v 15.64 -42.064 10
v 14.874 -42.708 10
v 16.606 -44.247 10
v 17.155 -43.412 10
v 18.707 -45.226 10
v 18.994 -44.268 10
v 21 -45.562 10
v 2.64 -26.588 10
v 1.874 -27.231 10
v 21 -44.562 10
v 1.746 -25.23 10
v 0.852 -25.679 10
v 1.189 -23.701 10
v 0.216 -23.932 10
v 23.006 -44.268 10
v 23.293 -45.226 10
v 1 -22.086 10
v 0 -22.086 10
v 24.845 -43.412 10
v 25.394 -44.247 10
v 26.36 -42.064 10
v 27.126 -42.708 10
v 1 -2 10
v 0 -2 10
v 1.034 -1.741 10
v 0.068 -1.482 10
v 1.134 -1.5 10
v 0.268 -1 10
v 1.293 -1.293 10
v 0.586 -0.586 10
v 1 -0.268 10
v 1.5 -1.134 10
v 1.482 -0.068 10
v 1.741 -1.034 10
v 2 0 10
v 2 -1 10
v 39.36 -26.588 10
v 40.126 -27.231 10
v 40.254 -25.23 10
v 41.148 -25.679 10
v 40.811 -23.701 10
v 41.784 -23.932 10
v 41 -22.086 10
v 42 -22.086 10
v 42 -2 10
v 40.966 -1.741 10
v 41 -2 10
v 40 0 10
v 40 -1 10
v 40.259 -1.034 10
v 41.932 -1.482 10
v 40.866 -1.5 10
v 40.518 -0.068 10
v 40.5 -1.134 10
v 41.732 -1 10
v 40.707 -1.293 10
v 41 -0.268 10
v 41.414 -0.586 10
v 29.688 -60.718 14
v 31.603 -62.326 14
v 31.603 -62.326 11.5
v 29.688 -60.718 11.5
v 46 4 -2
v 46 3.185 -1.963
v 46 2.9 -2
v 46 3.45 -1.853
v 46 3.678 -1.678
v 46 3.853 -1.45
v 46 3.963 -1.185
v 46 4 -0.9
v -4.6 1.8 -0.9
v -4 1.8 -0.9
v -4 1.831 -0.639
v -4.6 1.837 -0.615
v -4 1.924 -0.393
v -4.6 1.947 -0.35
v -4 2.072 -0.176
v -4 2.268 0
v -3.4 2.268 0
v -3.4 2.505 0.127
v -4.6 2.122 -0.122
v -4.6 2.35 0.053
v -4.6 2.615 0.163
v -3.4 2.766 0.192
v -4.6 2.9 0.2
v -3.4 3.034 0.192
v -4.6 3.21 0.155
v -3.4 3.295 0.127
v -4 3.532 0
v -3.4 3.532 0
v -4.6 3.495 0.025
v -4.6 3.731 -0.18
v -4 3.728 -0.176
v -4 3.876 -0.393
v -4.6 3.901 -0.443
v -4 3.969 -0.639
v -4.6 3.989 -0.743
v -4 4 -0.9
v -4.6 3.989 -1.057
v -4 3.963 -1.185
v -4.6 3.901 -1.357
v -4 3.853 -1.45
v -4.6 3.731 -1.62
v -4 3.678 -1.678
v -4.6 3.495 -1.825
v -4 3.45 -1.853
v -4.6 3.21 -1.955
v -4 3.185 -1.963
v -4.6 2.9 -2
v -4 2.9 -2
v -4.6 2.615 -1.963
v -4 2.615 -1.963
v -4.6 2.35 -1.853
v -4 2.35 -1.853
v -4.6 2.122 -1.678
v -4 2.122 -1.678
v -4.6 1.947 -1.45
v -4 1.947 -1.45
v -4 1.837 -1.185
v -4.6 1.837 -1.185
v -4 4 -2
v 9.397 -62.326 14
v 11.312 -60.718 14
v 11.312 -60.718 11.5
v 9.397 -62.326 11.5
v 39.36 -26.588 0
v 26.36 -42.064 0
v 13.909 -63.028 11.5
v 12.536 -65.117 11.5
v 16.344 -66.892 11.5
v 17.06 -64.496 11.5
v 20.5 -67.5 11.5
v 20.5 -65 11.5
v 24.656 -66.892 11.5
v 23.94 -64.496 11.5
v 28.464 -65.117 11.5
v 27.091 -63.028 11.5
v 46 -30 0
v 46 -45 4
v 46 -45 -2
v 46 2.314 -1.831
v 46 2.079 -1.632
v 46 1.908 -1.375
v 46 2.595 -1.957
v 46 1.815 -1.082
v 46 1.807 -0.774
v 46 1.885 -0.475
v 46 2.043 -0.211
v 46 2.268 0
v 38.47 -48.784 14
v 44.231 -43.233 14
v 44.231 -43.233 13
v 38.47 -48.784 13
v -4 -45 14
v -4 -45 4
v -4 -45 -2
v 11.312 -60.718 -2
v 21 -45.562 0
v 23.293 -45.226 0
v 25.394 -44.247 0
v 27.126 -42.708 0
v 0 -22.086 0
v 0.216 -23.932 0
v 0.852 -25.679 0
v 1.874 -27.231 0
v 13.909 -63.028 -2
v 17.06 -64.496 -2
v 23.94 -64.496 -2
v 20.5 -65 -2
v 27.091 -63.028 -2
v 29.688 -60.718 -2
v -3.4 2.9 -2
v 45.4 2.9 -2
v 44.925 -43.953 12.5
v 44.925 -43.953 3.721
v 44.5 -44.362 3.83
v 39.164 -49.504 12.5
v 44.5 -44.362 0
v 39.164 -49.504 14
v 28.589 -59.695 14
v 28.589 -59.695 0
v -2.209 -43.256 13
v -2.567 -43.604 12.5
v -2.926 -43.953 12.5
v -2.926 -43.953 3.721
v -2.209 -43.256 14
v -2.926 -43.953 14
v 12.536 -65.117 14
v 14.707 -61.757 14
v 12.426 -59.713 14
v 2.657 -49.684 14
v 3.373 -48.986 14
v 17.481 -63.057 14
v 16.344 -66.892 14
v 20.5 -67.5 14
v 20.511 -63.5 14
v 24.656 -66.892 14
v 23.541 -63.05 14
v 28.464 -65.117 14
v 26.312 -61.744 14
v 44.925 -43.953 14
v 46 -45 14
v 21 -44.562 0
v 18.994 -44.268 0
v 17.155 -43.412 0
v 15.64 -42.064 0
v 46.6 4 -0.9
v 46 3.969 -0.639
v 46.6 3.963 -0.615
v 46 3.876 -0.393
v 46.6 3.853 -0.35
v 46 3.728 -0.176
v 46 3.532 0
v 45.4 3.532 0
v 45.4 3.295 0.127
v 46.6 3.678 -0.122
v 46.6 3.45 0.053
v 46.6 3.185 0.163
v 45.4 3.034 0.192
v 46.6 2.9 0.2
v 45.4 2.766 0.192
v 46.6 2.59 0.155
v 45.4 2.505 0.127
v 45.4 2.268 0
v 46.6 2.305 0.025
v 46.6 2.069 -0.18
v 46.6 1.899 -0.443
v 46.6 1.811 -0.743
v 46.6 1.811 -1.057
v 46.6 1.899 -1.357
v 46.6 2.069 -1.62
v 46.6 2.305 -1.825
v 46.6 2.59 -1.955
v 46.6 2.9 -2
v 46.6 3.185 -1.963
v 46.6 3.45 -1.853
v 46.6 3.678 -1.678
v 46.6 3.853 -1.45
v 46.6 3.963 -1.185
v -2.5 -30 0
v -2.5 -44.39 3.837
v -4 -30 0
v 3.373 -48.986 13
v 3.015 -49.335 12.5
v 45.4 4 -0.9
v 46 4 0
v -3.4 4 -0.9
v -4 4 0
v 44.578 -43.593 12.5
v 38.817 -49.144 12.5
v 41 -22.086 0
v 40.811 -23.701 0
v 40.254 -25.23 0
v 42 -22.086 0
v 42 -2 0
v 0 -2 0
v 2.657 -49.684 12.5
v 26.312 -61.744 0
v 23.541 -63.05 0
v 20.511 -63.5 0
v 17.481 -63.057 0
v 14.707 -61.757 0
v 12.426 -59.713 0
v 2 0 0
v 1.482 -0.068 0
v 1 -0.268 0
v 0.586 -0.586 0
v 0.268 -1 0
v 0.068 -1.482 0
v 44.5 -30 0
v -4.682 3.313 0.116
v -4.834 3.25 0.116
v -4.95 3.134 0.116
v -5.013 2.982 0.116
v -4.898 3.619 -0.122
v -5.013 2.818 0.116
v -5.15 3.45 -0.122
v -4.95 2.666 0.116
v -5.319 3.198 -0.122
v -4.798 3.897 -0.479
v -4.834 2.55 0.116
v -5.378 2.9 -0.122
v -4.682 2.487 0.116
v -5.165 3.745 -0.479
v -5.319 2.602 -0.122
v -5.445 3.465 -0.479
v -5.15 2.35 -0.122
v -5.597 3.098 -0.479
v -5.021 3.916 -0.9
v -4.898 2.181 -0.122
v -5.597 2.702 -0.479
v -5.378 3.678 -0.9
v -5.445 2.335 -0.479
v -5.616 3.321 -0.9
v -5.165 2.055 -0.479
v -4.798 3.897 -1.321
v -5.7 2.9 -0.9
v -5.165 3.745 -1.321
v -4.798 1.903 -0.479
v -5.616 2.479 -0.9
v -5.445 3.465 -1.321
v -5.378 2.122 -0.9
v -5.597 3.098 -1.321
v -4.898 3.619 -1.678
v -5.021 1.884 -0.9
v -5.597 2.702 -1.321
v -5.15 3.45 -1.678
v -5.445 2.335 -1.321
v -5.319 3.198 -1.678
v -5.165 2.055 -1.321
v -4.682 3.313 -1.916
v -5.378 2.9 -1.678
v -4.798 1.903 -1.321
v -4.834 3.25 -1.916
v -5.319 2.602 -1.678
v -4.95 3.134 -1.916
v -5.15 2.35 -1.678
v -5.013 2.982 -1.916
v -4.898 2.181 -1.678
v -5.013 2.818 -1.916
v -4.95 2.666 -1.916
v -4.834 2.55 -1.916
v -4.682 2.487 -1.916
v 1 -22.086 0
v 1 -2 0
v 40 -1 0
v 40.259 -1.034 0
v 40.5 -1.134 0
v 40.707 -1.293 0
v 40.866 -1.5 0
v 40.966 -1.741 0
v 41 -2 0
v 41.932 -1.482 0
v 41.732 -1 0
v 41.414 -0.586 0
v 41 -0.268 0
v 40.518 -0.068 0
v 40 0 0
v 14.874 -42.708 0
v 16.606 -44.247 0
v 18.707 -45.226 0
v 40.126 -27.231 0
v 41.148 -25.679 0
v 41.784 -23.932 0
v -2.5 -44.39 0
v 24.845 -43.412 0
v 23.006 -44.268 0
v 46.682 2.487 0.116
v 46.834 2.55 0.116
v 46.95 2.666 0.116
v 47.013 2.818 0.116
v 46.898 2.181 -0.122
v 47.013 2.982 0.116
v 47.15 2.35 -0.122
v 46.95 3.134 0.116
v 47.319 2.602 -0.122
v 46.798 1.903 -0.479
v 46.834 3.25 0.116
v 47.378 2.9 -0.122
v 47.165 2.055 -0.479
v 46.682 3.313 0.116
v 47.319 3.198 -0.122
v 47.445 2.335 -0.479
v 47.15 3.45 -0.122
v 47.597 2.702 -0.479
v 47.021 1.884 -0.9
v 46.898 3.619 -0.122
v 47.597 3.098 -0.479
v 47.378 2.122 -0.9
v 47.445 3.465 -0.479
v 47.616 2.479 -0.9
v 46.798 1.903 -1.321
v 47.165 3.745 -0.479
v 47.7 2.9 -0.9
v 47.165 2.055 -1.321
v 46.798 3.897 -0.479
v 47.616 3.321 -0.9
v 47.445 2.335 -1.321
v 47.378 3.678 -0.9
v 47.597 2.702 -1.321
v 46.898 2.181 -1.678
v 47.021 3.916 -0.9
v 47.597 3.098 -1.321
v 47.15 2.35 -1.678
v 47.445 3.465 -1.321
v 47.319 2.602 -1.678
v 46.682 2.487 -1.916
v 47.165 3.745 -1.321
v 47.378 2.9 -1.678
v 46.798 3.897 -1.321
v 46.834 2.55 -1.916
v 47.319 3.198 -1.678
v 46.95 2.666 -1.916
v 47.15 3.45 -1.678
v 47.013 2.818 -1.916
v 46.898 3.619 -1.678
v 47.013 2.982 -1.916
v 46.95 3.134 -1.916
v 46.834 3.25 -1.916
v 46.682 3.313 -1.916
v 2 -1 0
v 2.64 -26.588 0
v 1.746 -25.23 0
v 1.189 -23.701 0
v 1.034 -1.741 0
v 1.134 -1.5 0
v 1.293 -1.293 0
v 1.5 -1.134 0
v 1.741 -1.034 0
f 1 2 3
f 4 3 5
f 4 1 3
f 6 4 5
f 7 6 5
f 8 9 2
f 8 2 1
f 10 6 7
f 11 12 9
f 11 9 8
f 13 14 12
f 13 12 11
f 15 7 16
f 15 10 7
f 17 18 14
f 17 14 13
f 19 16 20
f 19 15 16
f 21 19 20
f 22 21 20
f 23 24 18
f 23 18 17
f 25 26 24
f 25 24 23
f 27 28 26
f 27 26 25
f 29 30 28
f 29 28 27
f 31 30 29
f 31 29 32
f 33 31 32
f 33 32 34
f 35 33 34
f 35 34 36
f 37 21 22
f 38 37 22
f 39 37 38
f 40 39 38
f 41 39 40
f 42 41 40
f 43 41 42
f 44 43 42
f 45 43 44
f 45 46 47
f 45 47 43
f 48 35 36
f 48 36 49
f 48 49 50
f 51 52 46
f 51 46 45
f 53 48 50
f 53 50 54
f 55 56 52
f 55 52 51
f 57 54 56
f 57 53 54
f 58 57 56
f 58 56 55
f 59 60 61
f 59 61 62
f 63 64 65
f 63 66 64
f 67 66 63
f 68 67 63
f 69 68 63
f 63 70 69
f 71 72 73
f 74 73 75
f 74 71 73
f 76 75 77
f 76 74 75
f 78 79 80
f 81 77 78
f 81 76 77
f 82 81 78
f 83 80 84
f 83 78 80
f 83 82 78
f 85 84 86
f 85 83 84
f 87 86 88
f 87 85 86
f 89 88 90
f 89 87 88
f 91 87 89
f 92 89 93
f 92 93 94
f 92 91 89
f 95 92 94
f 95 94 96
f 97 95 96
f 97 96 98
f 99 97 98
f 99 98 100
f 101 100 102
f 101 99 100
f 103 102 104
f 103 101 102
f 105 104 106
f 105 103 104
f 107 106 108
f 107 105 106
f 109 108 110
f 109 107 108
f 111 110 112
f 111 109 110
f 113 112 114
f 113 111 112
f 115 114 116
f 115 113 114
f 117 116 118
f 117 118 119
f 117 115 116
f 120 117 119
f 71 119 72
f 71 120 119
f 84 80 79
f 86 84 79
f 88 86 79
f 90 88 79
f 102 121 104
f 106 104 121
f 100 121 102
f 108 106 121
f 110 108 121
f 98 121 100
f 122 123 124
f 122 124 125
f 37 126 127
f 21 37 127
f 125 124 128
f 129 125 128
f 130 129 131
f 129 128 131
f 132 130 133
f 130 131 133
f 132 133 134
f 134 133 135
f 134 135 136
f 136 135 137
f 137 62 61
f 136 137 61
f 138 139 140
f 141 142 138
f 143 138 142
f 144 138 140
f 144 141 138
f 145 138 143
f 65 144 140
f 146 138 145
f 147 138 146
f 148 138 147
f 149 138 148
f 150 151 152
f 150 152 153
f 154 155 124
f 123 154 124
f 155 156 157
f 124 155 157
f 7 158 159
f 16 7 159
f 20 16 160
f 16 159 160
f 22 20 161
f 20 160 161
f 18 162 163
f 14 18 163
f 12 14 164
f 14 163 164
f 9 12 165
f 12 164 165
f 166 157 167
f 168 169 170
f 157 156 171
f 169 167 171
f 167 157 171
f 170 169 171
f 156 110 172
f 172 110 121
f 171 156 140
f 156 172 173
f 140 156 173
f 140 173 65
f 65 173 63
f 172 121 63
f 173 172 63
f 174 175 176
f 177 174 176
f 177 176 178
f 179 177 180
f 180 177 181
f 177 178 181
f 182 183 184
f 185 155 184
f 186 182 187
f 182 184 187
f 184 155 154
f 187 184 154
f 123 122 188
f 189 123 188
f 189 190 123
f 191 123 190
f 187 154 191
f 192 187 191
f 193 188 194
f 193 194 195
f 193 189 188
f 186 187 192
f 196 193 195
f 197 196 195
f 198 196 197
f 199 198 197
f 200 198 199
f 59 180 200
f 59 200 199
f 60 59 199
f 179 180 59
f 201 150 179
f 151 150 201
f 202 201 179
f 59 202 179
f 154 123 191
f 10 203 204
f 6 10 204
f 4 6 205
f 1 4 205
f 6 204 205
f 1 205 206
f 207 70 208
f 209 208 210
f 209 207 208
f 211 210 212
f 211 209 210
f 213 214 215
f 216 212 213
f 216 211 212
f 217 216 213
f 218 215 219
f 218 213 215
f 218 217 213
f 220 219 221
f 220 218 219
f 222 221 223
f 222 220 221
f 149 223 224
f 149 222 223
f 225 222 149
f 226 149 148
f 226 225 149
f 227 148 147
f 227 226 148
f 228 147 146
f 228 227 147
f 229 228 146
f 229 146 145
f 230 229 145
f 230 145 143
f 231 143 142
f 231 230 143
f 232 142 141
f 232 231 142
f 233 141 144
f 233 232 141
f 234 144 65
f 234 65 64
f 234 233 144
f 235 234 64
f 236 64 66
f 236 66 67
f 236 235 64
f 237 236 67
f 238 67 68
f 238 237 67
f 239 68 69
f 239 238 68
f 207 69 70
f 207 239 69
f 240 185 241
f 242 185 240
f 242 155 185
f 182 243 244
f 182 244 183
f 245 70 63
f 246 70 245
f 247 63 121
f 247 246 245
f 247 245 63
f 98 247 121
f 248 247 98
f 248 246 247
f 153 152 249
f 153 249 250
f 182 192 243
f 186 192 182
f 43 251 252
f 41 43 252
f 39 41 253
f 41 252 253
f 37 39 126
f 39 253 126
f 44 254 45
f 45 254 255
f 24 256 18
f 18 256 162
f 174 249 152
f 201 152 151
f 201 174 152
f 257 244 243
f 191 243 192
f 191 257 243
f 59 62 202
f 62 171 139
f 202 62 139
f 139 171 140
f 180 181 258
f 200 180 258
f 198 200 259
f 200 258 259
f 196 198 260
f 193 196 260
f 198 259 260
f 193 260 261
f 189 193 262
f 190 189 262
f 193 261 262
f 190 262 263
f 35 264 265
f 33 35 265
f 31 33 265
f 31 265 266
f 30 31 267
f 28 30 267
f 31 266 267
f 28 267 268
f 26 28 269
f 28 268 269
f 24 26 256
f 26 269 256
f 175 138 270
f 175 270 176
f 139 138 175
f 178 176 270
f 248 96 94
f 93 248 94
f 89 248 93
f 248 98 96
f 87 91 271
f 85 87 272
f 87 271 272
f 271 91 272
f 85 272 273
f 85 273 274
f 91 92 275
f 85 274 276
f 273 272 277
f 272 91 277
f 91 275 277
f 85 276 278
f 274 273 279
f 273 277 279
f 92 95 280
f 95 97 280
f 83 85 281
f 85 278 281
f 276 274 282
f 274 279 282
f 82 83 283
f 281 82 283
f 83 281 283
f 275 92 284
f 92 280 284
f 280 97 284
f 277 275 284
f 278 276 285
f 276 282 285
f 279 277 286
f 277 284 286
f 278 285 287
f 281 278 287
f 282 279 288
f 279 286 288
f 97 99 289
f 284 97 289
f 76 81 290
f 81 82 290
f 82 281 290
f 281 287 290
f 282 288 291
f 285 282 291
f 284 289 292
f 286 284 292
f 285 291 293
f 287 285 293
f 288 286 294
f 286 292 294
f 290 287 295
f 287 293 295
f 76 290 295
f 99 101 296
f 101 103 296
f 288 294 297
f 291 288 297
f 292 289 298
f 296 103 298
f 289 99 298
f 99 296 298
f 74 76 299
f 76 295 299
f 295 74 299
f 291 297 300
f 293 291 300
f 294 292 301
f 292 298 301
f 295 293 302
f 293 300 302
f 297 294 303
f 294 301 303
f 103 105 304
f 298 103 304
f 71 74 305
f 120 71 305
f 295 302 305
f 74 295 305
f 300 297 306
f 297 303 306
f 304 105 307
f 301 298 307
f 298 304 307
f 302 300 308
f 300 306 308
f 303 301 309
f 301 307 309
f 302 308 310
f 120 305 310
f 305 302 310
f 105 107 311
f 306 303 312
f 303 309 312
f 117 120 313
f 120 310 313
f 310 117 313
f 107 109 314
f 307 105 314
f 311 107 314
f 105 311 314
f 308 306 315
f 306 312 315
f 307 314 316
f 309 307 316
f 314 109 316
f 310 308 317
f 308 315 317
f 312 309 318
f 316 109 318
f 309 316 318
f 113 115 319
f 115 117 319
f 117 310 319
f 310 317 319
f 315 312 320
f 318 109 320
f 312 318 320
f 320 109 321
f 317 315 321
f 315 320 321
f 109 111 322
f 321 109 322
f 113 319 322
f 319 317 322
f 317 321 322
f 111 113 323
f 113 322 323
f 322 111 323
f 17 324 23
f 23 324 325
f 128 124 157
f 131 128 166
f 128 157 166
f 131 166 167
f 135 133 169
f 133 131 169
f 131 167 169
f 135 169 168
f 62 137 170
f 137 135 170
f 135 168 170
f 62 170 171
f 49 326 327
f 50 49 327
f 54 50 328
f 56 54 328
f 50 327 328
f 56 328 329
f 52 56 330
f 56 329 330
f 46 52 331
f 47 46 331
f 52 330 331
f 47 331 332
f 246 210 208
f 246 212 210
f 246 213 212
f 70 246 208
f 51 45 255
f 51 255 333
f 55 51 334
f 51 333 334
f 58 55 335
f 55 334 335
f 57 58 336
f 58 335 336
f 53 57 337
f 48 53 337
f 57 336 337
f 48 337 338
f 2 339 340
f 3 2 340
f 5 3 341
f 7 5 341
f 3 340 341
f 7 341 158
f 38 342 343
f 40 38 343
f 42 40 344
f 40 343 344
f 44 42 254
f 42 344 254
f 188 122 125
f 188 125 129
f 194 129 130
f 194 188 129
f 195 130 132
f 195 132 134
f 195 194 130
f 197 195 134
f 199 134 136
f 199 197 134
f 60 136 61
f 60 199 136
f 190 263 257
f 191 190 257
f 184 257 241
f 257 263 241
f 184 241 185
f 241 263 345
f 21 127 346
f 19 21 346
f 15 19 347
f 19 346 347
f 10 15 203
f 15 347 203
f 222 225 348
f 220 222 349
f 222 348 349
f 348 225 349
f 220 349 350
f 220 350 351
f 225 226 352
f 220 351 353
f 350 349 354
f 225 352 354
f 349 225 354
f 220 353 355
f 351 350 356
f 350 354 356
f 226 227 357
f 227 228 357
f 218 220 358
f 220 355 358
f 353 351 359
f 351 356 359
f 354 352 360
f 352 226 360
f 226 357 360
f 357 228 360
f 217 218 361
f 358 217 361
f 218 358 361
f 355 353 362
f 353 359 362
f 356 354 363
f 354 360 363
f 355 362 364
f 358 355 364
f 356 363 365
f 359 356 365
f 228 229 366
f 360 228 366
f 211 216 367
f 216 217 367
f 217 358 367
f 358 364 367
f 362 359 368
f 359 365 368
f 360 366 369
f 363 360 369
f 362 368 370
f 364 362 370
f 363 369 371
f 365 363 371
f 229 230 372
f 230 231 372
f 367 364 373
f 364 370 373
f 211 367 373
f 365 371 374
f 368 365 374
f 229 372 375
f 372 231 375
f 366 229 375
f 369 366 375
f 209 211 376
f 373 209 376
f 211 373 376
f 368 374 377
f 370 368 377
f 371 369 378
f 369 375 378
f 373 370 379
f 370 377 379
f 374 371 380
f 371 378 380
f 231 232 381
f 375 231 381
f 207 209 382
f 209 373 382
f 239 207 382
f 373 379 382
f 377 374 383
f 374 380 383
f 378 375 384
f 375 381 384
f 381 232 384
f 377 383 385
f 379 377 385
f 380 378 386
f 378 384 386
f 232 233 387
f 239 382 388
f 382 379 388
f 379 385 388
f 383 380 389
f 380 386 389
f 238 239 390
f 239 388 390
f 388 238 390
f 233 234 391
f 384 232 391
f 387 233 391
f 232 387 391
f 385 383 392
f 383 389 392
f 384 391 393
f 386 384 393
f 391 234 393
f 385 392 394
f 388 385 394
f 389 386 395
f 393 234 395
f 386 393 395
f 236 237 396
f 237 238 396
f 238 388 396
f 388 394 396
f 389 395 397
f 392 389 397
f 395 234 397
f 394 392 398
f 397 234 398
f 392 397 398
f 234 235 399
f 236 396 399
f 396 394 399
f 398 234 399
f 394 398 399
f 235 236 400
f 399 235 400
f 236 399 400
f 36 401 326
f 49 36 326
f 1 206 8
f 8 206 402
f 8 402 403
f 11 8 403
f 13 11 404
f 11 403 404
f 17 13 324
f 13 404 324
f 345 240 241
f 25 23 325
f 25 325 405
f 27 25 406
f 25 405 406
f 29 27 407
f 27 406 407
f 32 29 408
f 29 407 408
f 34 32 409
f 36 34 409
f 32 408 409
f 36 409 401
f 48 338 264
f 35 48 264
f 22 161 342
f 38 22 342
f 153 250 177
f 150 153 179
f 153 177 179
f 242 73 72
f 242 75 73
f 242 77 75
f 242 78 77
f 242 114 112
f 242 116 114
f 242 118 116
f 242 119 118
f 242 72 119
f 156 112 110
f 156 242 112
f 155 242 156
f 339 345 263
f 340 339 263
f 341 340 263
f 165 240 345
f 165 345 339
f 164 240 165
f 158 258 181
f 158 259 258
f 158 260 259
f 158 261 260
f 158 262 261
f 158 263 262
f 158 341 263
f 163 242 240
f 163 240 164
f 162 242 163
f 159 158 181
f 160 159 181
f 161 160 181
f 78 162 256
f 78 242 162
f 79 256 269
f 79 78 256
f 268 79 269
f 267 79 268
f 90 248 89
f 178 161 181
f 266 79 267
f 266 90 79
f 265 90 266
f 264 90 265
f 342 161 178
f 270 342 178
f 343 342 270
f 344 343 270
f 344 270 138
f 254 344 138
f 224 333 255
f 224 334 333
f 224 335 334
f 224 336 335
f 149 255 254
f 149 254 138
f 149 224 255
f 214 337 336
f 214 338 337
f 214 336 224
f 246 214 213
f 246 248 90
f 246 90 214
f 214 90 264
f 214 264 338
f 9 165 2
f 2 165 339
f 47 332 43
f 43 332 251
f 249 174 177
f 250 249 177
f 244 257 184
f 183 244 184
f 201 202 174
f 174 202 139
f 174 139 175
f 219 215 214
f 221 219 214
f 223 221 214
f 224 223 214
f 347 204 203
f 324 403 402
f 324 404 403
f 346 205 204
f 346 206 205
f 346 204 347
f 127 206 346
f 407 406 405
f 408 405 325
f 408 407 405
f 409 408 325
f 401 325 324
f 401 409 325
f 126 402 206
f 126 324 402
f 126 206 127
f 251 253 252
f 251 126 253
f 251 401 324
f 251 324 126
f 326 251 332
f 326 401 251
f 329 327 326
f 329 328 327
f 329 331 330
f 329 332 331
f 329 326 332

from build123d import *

# Parameters (mm, degrees)
F1_DEPTH  = 10
F3_DEPTH  = 2
F4_R      = 1.1
F5_DEPTH  = 0.6
F6_R      = 1.1
F7_DEPTH  = 0.6
F13_DEPTH = 14
F14_W     = 8
F14_H     = 1.5
F15_DEPTH = 1
F16_SIZE  = 0.5
F17_W     = 8
F17_H     = 1.5
F18_DEPTH = 1
F19_SIZE  = 0.5
F21_DEPTH = 2.5
F23_DEPTH = 1.5
F25_DEPTH = 1.5


with BuildPart() as f1:
    # F0 (on Top) → F1 (new body)
    with BuildSketch(Plane.XY):
        with BuildLine():
            Line((21, 0), (2, 0))
            ThreePointArc((2, 0), (0.5857864376, -0.5857864376), (0, -2))
            Line((0, -2), (0, -22.0858455487))
            ThreePointArc((0, -22.0858455487), (0.4831818119, -24.8239916965), (1.8743610817, -27.2313822401))
            Line((1.8743610817, -27.2313822401), (14.8743610817, -42.7075727163))
            ThreePointArc((14.8743610817, -42.7075727163), (17.6209685952, -44.8133908477), (21, -45.5620360249))
            Line((21, -45.5620360249), (21, -44.5620360249))
            ThreePointArc((21, -44.5620360249), (18.0433475208, -43.9069714948), (15.6400659465, -42.0643806299))
            Line((15.6400659465, -42.0643806299), (2.6400659465, -26.5881901537))
            ThreePointArc((2.6400659465, -26.5881901537), (1.4227840854, -24.481723428), (1, -22.0858455487))
            Line((1, -22.0858455487), (1, -2))
            ThreePointArc((1, -2), (1.2928932188, -1.2928932188), (2, -1))
            Line((2, -1), (21, -1))
            Line((21, -1), (21, 0))
        make_face()
        with BuildLine():
            Line((40, 0), (21, 0))
            Line((21, 0), (21, -1))
            Line((21, -1), (40, -1))
            ThreePointArc((40, -1), (40.7071067812, -1.2928932188), (41, -2))
            Line((41, -2), (41, -22.0858455487))
            ThreePointArc((41, -22.0858455487), (40.5772159146, -24.481723428), (39.3599340535, -26.5881901537))
            Line((39.3599340535, -26.5881901537), (26.3599340535, -42.0643806299))
            ThreePointArc((26.3599340535, -42.0643806299), (23.9566524792, -43.9069714948), (21, -44.5620360249))
            Line((21, -44.5620360249), (21, -45.5620360249))
            ThreePointArc((21, -45.5620360249), (24.3790314048, -44.8133908477), (27.1256389183, -42.7075727163))
            Line((27.1256389183, -42.7075727163), (40.1256389183, -27.2313822401))
            ThreePointArc((40.1256389183, -27.2313822401), (41.5168181881, -24.8239916965), (42, -22.0858455487))
            Line((42, -22.0858455487), (42, -2))
            ThreePointArc((42, -2), (41.4142135624, -0.5857864376), (40, 0))
        make_face()
    extrude(amount=F1_DEPTH)

    # F2 (on Top) → F3 (join)
    with BuildSketch(Plane.XY):
        with BuildLine():
            Line((46, -45), (46, 4))
            Line((46, 4), (-4, 4))
            Line((-4, 4), (-4, -45))
            Line((-4, -45), (11.3115416225, -60.7183050371))
            ThreePointArc((11.3115416225, -60.7183050371), (20.5, -65), (29.6884583775, -60.7183050371))
            Line((29.6884583775, -60.7183050371), (46, -45))
        make_face()
    extrude(amount=-F3_DEPTH)

    # F4 (on face) → F5 (join, symmetric)
    with BuildSketch(Plane.YZ.offset(46)):
        with Locations((2.9, -0.9)):
            Circle(F4_R)
    extrude(amount=F5_DEPTH, both=True)

    # F6 (on face) → F7 (join, symmetric)
    with BuildSketch(Plane(origin=(-4, 0, 0), x_dir=(0, -1, 0), z_dir=(-1, 0, 0))):
        with Locations((-2.9, -0.9)):
            Circle(F6_R)
    extrude(amount=F7_DEPTH, both=True)

    # F8 (on face) → F9 (revolve)
    with BuildSketch(Plane(origin=(-4.6, 0, 0), x_dir=(0, -1, 0), z_dir=(-1, 0, 0))):
        with BuildLine():
            Line((-2.9, -2), (-2.9, 0.2))
            ThreePointArc((-2.9, 0.2), (-4, -0.9), (-2.9, -2))
        make_face()
    revolve(axis=Axis((-4.6, 2.9, -0.9), (0, 0, 1)))

    # F10 (on face) → F11 (revolve)
    with BuildSketch(Plane.YZ.offset(46.6)):
        with BuildLine():
            Line((2.9, -2), (2.9, 0.2))
            ThreePointArc((2.9, 0.2), (1.8, -0.9), (2.9, -2))
        make_face()
    revolve(axis=Axis((46.6, 2.9, -0.9), (0, 0, 1)))

    # F12 (on face) → F13 (join)
    with BuildSketch(Plane.XY):
        with BuildLine():
            Line((-2.9255281827, -43.9533337142), (-4, -45))
            Line((-4, -45), (11.3115416225, -60.7183050371))
            ThreePointArc((11.3115416225, -60.7183050371), (20.5, -65), (29.6884583775, -60.7183050371))
            Line((29.6884583775, -60.7183050371), (46, -45))
            Line((46, -45), (44.9249905697, -43.9528100137))
            Line((44.9249905697, -43.9528100137), (28.5888193042, -59.6948489351))
            ThreePointArc((28.5888193042, -59.6948489351), (20.5114901112, -63.4999937132), (12.4258523564, -59.7125360207))
            Line((12.4258523564, -59.7125360207), (-2.9255281827, -43.9533337142))
        make_face()
    extrude(amount=F13_DEPTH)

    # F14 (on face) → F15 (join)
    with BuildSketch(Plane(origin=(43.5920408851, -45.2372814773, 0), x_dir=(-0.7200798684, -0.6938911897, 0), z_dir=(-0.6938911897, 0.7200798684, 0))):
        with Locations((2.1488863345, 13.25)):
            Rectangle(F14_W, F14_H)
    extrude(amount=F15_DEPTH)

    # F16
    f16_edges = [f1.edges().sort_by_distance(p)[0] for p in [
        (41.35078, -46.008295, 12.5),
    ]]
    chamfer(f16_edges, length=F16_SIZE)

    # F17 (on face) → F18 (join)
    with BuildSketch(Plane(origin=(-23.4702228156, -22.8628527493, 0), x_dir=(-0.6977775239, 0.7163145449, 0), z_dir=(0.7163145449, 0.6977775239, 0))):
        with Locations((-33.4430444229, 13.25)):
            Rectangle(F17_W, F17_H)
    extrude(amount=F18_DEPTH)

    # F19
    f19_edges = [f1.edges().sort_by_distance(p)[0] for p in [
        (0.581896, -46.120814, 12.5),
    ]]
    chamfer(f19_edges, length=F19_SIZE)

    # F20 (on face) → F21 (join)
    with BuildSketch(Plane.XY.offset(14)):
        with BuildLine():
            ThreePointArc((29.6884583775, -60.7183050371), (20.5, -65), (11.3115416225, -60.7183050371))
            Line((11.3115416225, -60.7183050371), (9.3972794606, -62.3262852531))
            ThreePointArc((9.3972794606, -62.3262852531), (20.5, -67.5), (31.6027205394, -62.3262852531))
            Line((31.6027205394, -62.3262852531), (29.6884583775, -60.7183050371))
        make_face()
    extrude(amount=-F21_DEPTH)

    # F22 (on face) → F23 (join)
    with BuildSketch(Plane.YZ.offset(46)):
        Polygon((-45, 4), (-45, 0), (-30, 0), align=None)
    extrude(amount=-F23_DEPTH)

    # F24 (on face) → F25 (join)
    with BuildSketch(Plane(origin=(-4, 0, 0), x_dir=(0, -1, 0), z_dir=(-1, 0, 0))):
        Polygon((30, 0), (45, 0), (45, 4), align=None)
    extrude(amount=-F25_DEPTH)


solid = f1.part
